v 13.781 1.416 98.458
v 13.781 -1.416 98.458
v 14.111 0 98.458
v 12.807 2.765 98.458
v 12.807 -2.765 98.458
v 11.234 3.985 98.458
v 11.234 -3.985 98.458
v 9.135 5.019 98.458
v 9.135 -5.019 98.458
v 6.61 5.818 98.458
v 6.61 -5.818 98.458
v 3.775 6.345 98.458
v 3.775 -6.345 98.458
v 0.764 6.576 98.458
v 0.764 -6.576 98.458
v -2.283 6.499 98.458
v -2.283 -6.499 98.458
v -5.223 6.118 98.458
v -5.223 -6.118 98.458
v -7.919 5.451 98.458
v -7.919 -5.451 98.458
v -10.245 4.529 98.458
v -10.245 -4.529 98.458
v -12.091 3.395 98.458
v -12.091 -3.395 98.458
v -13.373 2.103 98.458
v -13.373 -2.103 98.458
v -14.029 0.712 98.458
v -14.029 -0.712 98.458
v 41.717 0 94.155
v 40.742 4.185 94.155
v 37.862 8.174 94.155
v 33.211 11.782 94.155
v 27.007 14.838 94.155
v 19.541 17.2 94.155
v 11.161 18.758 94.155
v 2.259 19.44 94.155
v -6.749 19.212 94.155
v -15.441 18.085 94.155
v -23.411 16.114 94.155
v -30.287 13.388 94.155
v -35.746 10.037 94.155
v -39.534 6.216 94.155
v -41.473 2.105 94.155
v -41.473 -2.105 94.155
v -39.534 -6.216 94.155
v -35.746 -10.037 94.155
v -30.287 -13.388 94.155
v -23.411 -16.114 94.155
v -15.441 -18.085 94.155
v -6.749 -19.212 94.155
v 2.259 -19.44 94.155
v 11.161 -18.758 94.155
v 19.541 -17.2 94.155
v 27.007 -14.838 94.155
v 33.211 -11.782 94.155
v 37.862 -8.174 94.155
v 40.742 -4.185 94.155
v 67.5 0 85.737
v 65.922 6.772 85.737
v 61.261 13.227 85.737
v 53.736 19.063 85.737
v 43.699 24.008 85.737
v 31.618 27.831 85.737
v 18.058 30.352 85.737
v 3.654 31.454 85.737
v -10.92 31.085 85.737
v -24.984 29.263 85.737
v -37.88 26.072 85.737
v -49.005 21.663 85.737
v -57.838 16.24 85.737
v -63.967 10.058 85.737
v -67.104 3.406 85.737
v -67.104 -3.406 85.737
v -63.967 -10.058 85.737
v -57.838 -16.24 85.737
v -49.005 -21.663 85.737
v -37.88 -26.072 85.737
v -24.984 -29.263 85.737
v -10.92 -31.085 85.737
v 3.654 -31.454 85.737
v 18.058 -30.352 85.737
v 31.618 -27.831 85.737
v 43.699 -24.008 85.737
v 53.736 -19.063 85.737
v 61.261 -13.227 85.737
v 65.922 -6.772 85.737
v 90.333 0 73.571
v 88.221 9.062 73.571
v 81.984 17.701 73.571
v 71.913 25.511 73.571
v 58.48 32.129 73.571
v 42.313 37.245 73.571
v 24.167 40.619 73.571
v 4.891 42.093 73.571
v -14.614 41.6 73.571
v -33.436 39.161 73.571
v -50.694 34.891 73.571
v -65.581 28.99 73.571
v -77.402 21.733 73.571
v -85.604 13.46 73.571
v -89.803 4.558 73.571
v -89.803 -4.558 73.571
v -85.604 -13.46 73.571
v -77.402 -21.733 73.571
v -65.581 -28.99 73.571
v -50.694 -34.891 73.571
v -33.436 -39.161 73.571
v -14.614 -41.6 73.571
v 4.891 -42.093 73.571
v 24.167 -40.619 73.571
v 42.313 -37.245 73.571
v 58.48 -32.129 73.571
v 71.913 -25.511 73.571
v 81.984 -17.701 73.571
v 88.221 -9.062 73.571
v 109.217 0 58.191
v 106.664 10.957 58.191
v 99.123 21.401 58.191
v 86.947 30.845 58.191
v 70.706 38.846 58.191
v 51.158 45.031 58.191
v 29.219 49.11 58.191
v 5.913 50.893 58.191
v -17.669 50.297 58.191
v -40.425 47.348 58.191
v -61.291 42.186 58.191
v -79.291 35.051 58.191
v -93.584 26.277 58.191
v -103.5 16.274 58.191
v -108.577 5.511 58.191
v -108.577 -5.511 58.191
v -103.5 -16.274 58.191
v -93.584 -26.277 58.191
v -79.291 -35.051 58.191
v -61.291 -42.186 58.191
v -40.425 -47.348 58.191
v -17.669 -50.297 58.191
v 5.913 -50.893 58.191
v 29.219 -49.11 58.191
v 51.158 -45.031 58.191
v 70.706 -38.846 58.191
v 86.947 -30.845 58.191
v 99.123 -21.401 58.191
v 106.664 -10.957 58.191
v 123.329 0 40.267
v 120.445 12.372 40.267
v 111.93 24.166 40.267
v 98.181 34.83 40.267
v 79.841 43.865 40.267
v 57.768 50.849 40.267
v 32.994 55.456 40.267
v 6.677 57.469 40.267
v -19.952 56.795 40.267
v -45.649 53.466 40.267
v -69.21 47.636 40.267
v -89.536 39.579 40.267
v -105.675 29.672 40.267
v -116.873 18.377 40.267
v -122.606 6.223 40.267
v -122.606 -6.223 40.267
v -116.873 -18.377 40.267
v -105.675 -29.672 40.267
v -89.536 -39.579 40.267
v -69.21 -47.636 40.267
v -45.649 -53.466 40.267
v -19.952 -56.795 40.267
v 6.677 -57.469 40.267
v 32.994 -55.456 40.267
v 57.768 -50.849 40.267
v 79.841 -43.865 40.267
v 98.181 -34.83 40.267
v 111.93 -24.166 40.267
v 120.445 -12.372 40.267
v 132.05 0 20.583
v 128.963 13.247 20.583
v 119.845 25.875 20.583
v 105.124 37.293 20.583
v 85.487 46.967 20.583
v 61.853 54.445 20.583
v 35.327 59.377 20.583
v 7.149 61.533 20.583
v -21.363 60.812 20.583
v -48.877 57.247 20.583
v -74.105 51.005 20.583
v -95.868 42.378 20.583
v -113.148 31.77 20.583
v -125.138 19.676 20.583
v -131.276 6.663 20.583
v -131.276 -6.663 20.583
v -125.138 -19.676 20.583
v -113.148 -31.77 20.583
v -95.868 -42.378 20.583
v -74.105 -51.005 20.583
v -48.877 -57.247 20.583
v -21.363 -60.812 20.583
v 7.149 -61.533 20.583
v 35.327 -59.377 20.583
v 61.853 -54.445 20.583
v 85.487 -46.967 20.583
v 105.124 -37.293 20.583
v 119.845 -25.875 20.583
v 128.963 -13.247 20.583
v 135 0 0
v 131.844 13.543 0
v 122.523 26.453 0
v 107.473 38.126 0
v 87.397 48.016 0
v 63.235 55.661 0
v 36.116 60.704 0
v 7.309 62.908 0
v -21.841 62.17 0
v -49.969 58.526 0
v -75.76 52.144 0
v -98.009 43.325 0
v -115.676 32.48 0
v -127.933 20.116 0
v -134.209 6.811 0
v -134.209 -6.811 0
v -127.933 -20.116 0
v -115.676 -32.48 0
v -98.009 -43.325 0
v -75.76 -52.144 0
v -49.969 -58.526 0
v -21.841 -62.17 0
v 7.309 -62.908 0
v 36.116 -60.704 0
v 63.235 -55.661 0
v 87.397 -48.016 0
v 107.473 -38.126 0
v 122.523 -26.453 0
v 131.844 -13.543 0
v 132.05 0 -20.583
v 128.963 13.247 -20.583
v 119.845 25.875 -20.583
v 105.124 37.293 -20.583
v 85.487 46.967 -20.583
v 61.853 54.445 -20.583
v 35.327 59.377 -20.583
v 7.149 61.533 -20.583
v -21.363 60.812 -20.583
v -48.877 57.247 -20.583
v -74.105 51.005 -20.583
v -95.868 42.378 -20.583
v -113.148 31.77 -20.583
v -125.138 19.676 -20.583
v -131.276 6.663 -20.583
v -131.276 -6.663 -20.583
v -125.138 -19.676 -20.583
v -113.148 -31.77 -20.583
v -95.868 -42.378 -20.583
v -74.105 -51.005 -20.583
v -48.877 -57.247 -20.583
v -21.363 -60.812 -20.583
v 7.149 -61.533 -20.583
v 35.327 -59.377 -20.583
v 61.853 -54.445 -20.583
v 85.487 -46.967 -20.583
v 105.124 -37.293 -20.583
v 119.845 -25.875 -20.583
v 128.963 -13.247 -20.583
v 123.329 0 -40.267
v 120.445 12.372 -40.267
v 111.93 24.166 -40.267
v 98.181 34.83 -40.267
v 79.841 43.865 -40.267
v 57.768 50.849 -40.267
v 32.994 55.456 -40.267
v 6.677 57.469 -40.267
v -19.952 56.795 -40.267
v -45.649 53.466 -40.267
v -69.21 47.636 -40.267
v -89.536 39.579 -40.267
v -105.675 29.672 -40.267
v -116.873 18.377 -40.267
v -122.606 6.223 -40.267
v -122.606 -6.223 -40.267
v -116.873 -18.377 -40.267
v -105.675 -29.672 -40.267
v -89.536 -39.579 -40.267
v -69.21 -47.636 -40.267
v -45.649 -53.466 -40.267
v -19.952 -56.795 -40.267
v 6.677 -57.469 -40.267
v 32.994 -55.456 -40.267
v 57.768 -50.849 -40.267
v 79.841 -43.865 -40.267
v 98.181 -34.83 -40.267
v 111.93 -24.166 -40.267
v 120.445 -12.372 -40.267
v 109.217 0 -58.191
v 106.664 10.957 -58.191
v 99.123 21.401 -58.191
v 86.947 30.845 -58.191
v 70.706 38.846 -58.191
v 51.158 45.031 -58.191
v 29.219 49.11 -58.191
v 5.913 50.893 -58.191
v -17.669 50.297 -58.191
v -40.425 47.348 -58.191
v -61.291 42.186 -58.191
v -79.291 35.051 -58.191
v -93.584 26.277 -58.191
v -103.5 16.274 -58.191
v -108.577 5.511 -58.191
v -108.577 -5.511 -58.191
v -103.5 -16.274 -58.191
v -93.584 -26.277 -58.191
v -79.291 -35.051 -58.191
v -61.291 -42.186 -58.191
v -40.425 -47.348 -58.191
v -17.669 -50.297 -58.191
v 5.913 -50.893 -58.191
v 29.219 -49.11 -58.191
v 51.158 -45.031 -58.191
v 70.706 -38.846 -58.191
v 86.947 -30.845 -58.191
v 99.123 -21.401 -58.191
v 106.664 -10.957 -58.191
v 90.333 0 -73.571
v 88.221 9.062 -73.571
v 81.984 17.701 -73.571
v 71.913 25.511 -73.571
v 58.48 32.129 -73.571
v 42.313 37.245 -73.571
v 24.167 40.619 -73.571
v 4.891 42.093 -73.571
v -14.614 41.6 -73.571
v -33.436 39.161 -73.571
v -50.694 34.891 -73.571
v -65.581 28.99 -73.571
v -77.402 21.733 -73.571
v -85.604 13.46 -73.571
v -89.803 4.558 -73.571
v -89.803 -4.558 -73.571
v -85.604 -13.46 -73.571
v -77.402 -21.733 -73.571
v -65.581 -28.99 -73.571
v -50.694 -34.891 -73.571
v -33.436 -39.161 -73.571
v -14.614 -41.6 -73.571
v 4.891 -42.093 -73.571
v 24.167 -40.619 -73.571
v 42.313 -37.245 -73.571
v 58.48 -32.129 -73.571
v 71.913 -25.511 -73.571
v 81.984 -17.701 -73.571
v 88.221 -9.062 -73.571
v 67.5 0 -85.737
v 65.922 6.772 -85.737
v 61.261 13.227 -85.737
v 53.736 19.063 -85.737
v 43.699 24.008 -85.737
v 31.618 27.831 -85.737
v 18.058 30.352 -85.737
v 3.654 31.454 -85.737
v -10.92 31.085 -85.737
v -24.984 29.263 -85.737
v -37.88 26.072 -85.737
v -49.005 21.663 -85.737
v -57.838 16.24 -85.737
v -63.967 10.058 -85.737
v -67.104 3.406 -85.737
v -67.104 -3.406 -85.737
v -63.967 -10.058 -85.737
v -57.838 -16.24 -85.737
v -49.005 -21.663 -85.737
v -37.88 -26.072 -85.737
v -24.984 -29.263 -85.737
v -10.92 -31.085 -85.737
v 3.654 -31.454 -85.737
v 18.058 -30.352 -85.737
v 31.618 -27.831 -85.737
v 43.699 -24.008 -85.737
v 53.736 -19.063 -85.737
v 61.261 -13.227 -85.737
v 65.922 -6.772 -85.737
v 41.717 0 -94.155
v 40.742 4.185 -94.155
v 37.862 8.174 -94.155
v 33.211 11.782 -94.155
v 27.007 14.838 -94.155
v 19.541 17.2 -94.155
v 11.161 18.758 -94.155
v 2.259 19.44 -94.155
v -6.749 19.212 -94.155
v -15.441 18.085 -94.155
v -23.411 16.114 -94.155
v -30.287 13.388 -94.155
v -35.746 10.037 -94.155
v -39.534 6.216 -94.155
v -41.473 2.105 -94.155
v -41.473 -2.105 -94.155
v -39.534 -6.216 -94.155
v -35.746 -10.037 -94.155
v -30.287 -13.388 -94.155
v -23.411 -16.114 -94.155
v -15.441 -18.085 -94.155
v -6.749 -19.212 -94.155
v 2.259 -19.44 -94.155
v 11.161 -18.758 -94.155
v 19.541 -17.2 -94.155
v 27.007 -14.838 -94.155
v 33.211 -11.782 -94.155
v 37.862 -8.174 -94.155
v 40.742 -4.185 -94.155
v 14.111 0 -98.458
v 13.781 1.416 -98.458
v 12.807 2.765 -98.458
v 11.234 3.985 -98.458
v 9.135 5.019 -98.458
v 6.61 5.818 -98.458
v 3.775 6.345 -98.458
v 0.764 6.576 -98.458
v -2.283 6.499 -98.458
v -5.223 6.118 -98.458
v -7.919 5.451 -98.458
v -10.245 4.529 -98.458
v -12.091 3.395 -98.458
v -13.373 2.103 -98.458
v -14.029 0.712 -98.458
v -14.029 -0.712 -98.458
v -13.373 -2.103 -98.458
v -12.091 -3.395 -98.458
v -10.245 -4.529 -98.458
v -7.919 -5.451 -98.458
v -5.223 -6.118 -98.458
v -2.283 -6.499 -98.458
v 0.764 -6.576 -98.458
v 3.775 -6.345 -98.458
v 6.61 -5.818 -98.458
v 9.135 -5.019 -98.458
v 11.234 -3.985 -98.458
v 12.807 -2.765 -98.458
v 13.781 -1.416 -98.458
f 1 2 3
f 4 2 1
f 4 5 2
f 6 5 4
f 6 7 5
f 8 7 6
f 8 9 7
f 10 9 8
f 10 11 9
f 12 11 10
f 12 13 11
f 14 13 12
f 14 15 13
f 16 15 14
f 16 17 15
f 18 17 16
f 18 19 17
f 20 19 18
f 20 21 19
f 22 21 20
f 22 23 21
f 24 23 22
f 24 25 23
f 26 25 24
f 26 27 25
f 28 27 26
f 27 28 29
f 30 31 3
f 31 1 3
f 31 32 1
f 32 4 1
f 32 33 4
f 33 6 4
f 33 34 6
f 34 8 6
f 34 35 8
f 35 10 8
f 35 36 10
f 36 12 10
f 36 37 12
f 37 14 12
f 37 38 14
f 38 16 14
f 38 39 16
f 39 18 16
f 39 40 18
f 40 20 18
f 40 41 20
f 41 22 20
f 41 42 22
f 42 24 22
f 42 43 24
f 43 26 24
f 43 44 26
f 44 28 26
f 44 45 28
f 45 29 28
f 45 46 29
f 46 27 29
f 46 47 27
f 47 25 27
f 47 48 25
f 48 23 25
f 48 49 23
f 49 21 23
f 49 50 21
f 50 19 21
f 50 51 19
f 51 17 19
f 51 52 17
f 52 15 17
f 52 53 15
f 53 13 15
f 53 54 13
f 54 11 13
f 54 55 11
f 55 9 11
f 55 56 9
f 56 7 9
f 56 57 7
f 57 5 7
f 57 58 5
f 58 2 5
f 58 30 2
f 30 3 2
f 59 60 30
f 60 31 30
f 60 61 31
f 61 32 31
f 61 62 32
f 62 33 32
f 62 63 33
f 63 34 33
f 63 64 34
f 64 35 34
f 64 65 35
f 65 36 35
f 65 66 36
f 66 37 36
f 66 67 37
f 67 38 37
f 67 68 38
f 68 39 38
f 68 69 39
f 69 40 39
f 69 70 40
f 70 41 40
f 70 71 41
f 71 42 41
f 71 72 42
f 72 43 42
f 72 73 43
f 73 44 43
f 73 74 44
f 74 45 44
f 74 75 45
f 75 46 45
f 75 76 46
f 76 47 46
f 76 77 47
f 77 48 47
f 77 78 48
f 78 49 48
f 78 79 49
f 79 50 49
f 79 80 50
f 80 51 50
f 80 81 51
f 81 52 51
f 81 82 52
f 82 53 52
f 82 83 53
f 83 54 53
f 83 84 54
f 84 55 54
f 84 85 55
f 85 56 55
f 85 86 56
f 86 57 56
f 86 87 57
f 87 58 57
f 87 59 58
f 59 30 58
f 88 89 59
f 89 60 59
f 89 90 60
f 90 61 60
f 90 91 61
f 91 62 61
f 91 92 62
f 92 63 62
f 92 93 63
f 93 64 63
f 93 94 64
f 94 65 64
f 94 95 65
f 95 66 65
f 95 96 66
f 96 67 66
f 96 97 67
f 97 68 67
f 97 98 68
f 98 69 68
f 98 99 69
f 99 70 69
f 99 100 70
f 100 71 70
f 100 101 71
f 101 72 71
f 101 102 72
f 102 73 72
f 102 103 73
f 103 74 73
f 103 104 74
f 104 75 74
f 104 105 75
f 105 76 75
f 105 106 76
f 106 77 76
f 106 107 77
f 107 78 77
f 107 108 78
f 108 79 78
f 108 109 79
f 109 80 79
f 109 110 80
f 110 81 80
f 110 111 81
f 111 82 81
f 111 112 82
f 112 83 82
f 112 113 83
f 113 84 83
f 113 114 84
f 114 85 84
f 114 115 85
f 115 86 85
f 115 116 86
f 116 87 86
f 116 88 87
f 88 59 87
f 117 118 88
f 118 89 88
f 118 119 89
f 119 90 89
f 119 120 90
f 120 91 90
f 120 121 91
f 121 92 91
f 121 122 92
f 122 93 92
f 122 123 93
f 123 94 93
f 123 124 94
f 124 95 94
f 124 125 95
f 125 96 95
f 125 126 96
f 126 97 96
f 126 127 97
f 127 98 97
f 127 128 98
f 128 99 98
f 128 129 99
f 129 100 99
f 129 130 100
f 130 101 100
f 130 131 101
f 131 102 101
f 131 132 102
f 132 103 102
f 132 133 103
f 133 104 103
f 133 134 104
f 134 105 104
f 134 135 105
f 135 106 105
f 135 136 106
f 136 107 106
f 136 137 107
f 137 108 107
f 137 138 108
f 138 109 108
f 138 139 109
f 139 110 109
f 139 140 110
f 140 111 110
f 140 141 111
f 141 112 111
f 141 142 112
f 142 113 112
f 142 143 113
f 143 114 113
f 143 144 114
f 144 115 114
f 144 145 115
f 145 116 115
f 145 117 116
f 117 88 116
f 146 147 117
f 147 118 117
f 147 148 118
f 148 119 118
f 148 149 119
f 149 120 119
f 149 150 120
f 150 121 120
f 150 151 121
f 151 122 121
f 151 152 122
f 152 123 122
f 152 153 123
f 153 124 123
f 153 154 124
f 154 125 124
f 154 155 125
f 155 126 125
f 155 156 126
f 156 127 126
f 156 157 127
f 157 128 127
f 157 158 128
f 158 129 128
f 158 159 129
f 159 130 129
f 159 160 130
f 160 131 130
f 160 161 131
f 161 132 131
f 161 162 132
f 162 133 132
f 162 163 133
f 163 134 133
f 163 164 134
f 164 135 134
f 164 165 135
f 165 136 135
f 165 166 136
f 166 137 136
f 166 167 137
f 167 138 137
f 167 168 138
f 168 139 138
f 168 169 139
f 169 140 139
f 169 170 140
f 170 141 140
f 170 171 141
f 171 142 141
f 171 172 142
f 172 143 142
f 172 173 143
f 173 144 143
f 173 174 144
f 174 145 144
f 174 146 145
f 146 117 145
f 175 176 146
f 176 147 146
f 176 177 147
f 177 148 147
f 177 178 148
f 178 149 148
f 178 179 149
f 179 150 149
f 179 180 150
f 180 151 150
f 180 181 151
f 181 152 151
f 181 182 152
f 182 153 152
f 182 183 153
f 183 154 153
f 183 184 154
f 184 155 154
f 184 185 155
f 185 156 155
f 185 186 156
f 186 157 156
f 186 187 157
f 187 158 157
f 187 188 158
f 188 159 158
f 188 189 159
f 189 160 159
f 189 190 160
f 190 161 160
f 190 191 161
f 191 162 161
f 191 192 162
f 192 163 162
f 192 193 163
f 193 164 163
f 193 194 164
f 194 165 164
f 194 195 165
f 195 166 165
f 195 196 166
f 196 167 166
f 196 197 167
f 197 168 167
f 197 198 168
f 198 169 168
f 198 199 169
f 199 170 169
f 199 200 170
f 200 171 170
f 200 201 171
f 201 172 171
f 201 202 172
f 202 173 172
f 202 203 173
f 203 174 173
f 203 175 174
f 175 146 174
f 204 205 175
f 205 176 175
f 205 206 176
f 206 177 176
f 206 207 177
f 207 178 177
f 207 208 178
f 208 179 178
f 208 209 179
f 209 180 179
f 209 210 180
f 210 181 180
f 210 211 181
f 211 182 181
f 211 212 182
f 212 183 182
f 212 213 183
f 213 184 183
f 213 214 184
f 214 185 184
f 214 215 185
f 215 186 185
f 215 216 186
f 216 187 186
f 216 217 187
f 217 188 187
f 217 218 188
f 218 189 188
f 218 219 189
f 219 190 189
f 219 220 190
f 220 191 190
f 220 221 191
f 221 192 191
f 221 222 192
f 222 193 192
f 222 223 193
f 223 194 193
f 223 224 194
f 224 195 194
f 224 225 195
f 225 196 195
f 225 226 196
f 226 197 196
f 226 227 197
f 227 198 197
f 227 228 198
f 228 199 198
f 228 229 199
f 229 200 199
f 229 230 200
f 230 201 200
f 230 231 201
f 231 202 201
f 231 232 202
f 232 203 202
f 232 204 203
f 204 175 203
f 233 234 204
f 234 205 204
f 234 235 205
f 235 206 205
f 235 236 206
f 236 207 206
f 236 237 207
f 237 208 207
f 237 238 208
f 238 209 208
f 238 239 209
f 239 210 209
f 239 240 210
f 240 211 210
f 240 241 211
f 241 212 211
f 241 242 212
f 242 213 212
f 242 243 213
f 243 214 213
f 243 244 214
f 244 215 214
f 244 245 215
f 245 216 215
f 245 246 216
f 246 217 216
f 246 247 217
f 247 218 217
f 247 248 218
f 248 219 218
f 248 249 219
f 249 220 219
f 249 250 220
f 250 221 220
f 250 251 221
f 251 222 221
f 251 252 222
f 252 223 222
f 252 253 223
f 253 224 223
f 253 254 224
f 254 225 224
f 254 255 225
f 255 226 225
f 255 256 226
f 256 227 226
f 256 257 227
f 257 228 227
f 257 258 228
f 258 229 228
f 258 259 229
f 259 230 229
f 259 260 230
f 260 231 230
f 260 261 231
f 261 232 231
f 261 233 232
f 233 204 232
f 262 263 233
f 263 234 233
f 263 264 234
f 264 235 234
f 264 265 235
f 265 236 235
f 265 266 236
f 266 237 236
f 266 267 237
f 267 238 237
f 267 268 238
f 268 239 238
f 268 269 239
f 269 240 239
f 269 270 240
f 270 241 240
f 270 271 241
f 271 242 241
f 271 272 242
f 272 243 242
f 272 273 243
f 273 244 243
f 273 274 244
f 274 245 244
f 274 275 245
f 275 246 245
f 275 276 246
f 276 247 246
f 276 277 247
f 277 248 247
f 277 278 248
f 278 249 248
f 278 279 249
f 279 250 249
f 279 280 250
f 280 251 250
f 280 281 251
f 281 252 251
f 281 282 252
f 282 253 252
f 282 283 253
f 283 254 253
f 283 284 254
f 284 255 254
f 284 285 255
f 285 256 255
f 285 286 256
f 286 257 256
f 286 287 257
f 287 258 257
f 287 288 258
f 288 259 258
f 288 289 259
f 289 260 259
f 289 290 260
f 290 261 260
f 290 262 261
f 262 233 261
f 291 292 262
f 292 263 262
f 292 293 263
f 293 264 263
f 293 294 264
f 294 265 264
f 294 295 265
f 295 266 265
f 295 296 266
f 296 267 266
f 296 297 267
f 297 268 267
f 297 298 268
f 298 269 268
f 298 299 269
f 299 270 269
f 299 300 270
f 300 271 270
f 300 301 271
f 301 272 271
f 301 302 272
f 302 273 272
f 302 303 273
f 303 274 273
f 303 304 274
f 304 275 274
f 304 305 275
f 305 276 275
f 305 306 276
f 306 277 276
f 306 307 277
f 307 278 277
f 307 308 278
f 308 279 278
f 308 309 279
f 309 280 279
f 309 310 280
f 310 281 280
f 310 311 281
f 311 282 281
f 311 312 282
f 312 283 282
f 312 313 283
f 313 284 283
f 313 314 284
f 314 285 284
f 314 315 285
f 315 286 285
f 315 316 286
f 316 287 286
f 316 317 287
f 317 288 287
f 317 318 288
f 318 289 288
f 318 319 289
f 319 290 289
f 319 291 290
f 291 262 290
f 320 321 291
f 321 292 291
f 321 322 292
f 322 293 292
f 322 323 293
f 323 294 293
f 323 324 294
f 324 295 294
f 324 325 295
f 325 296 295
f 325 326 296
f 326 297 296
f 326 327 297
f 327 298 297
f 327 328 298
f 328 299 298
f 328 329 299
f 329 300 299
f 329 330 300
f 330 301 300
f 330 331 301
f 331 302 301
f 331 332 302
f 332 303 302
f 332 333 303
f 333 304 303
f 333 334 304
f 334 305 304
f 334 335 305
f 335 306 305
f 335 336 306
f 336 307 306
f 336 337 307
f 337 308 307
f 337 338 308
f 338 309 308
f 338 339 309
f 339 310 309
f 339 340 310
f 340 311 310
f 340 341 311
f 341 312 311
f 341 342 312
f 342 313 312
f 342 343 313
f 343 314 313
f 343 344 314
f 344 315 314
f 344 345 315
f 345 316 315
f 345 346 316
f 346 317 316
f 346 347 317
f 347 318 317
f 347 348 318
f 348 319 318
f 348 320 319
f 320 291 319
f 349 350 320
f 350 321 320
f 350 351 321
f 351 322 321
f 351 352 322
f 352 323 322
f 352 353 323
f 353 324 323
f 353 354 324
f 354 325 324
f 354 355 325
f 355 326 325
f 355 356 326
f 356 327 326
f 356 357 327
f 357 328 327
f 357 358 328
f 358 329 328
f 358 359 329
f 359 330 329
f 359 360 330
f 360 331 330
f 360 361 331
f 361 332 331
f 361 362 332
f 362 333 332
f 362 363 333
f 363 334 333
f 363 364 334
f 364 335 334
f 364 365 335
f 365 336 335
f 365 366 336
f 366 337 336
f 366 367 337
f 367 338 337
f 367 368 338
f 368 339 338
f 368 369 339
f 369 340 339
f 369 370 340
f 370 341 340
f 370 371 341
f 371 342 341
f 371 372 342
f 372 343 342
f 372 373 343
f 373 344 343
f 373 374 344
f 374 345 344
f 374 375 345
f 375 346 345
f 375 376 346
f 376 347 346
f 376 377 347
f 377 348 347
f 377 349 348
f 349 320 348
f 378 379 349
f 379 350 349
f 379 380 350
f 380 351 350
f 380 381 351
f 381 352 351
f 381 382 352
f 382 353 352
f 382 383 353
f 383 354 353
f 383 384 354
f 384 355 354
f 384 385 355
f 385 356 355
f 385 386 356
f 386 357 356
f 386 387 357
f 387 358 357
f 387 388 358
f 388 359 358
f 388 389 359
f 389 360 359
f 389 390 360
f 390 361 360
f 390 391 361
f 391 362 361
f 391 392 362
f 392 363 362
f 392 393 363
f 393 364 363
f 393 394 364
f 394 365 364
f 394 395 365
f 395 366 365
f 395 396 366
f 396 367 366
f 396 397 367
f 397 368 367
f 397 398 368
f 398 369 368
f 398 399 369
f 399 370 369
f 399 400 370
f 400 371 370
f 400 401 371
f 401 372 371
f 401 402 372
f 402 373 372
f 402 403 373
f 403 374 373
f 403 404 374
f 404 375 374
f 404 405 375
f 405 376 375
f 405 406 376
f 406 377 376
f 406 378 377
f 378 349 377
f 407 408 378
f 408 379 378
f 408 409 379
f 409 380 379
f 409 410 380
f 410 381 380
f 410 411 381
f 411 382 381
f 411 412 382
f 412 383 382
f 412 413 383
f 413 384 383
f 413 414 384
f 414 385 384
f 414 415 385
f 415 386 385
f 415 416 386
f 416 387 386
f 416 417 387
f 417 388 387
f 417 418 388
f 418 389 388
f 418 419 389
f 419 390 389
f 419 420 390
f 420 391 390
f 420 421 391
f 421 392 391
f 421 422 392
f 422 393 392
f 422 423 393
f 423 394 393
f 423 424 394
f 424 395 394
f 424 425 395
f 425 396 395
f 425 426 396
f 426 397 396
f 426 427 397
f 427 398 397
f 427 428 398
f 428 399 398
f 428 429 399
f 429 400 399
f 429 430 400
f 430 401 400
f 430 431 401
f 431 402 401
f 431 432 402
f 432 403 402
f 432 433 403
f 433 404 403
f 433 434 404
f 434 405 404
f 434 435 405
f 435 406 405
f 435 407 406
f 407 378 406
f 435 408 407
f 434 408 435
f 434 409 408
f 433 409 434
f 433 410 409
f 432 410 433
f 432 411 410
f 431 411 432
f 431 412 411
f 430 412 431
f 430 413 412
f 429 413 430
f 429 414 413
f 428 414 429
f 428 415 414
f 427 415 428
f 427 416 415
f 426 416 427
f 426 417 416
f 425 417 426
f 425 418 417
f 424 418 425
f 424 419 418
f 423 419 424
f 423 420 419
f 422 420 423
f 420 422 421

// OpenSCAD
// Generated by SolidPython 1.0.1 on 2020-07-29 00:46:51


scale(v = [15, 7, 11]) {
	sphere(r = 9);
}
/***********************************************
*********      SolidPython code:      **********
************************************************
 
# import packages: SolidPython
from solid import *
from solid.utils import *
from itertools import chain, combinations, permutations


class Resize:

    def __init__(self, scad_file):
        self.scad_file = scad_file
        #self.scad_file = import_scad(scad_file)
        # cone/cylinder param:
        self.r1 = 0
        self.r2 = 0
        self.h = 0
        # rectangular prism param:
        self.w = 0
        self.l = 0
        # ellipse param:
        self.r = 0

    # import OpenScad code (file name corresponds to shape)


    # classify shape + parameters
    def assign(self, param1, param2, param3):
        if self.scad_file == 'cone.scad':
            self.r1 = param1
            self.r2 = param2
            self.h = param3
        elif self.scad_file == 'cylinder.scad':
            self.r1 = param1
            self.r2 = param2
            self.h = param3
        elif self.scad_file == 'rectangularPrism.scad':
            self.h = param1
            self.l = param2
            self.w = param3
        else:
            self.r = param1
            self.h = param2

    # resize parameters
    def iterate(self):
        x = range(3, 20, 2)
        i = 1
        if self.scad_file == 'cone.scad':
            tempList = list(permutations(x, 2))
            for temp in tempList:
                param1 = temp[0]
                param2 = temp[1]
                filepath = 'produced_scad_files/' + 'cone' + str(param1) + '_' + str(param2) + '_' + '.scad'
                scad_render_to_file(cylinder(h=param1, r1=param2, r2=0), filepath)

        elif self.scad_file == 'cylinder.scad':
            tempList = list(permutations(x, 3))
            for temp in tempList:
                param1 = temp[0]
                param2 = temp[1]
                filepath = 'produced_scad_files/' + 'cylinder' + str(param1) + '_' + str(param2) + '_' + '.scad'
                scad_render_to_file(cylinder(h=param1, r1=param2, r2=param2), filepath)

        elif self.scad_file == 'rectangularPrism.scad':
            tempList = list(permutations(x, 3))
            for temp in tempList:
                param1 = temp[0]
                param2 = temp[1]
                param3 = temp[2]
                filepath = 'produced_scad_files/' + 'rectangularPrism' + str(param1) + '_' + str(param2) + '_' + str(
                    param3) + '.scad'
                scad_render_to_file(cube(size=(param1, param2, param3)), filepath)

        elif self.scad_file == 'ellipse.scad':
            tempList = list(permutations(x, 4))
            for temp in tempList:
                param1 = temp[0]
                param2 = temp[1]
                param3 = temp[2]
                param4 = temp[3]
                filepath = 'produced_scad_files/' + 'ellipse' + str(param1) + '_' + str(param2) + '_' + str(param3) + '_' + str(param4) + '.scad'
                scad_render_to_file(scale([param1, param2, param3])(sphere(r=param4)), filepath)

    def render_to_scadfile(self):
        scad_render_to_file(scad, 'example.scad') 
 
************************************************/
